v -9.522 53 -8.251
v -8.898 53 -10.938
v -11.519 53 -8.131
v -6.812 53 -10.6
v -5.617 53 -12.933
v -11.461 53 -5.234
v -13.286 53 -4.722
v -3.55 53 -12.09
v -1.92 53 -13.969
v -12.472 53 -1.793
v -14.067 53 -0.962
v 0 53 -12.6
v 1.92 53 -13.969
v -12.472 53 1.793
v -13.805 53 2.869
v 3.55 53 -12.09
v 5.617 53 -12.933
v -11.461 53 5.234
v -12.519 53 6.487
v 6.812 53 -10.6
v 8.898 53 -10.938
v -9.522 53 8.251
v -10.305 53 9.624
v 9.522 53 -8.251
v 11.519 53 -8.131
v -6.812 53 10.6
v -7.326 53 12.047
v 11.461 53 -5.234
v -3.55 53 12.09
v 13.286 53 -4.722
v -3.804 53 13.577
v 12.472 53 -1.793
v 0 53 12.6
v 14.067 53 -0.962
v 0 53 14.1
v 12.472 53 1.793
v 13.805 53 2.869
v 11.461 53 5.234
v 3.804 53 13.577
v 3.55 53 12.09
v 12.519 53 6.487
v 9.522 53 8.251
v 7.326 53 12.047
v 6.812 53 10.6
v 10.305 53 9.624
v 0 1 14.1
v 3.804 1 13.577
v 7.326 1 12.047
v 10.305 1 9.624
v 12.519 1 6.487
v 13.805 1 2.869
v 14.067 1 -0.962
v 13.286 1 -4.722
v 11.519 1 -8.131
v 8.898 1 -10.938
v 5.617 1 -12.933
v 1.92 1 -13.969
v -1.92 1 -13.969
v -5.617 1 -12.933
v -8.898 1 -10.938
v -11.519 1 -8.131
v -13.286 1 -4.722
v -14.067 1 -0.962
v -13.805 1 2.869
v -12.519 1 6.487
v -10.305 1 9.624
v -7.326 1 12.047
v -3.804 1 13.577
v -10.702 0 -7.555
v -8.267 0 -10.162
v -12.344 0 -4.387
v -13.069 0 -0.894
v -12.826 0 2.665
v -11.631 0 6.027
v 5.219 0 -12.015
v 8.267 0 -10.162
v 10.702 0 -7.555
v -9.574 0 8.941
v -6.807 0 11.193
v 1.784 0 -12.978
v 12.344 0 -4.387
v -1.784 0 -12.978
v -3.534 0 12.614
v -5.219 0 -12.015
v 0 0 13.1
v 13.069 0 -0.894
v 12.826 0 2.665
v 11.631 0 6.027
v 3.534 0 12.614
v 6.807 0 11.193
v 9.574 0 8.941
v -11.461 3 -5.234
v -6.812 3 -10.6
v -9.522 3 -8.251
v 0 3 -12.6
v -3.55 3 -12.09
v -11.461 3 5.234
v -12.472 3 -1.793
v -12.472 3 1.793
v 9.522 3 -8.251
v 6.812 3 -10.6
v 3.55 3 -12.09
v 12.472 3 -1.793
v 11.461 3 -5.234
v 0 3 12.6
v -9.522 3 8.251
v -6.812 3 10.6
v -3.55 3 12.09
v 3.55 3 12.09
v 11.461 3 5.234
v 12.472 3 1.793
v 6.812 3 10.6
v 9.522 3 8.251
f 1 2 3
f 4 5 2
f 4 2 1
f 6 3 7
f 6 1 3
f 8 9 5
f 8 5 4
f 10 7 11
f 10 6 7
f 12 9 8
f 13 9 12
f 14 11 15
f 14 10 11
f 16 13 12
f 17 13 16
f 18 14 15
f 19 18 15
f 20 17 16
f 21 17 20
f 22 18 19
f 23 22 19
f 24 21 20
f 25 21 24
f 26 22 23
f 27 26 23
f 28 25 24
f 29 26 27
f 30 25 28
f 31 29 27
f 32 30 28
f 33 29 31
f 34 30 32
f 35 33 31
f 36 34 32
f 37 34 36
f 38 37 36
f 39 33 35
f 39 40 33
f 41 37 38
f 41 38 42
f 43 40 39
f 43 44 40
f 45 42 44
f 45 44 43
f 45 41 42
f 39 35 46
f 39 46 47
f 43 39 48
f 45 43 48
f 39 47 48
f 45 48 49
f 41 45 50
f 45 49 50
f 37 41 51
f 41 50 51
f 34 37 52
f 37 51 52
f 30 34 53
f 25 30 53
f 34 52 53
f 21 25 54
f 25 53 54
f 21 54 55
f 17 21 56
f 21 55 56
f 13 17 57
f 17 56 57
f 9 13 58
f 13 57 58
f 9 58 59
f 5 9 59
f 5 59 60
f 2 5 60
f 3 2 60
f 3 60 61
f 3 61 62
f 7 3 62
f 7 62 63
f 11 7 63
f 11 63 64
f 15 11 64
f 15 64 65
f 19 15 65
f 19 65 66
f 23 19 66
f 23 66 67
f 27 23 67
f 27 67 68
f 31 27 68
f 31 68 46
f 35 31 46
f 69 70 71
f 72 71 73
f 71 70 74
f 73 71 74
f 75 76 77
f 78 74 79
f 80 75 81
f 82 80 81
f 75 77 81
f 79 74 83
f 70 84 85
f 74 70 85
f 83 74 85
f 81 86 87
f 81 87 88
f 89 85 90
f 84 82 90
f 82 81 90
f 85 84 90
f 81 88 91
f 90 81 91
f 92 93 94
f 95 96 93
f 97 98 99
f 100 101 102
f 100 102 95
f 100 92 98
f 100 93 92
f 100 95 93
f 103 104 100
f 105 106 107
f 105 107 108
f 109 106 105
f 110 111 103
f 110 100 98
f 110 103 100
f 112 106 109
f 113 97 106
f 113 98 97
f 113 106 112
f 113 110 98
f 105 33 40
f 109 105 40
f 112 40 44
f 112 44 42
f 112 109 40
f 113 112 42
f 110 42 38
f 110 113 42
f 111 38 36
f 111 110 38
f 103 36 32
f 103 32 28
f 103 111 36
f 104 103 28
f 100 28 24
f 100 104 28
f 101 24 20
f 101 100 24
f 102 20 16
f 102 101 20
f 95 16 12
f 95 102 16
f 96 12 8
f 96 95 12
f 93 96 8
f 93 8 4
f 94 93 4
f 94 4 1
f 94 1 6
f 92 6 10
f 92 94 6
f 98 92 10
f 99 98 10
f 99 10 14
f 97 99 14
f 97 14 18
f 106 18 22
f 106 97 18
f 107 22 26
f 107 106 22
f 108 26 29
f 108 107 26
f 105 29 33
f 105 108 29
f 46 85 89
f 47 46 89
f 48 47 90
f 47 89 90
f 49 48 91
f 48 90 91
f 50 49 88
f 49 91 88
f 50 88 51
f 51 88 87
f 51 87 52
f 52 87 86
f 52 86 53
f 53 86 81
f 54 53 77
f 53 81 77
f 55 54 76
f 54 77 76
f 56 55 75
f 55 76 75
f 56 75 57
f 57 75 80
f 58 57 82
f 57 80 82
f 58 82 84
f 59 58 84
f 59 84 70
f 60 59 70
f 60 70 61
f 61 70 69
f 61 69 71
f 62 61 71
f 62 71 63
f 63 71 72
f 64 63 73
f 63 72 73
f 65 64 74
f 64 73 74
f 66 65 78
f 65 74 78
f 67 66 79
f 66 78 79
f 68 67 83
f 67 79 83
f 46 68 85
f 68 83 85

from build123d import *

# Parameters (mm, degrees)
SKETCH1_R           = 14.1
BOSS_EXTRUDE1_DEPTH = 3
SKETCH2_R           = 14.1
SKETCH2_R_2         = 12.6
BOSS_EXTRUDE2_DEPTH = 50
CHAMFER1_SIZE       = 1


with BuildPart() as part:
    # Sketch1 → Boss-Extrude1 (new body)
    with BuildSketch(Plane(origin=(0, 0, 0), x_dir=(1, 0, 0), z_dir=(0, 1, 0))):
        with Locations(Location((0, 0, 0), (0, 0, 270))):
            Circle(SKETCH1_R)
    extrude(amount=BOSS_EXTRUDE1_DEPTH)

    # Sketch2 → Boss-Extrude2 (add)
    with BuildSketch(Plane(origin=(0, 3, 0), x_dir=(1, 0, 0), z_dir=(0, 1, 0))):
        with Locations(Location((0, 0, 0), (0, 0, 270))):
            Circle(SKETCH2_R)
        with Locations(Location((0, 0, 0), (0, 0, 270))):
            Circle(SKETCH2_R_2, mode=Mode.SUBTRACT)
    extrude(amount=BOSS_EXTRUDE2_DEPTH)

    # Chamfer1
    chamfer1_edges = [part.edges().sort_by_distance(p)[0] for p in [
        (0, 0, -14.1),
    ]]
    chamfer(chamfer1_edges, length=CHAMFER1_SIZE)


solid = part.part
